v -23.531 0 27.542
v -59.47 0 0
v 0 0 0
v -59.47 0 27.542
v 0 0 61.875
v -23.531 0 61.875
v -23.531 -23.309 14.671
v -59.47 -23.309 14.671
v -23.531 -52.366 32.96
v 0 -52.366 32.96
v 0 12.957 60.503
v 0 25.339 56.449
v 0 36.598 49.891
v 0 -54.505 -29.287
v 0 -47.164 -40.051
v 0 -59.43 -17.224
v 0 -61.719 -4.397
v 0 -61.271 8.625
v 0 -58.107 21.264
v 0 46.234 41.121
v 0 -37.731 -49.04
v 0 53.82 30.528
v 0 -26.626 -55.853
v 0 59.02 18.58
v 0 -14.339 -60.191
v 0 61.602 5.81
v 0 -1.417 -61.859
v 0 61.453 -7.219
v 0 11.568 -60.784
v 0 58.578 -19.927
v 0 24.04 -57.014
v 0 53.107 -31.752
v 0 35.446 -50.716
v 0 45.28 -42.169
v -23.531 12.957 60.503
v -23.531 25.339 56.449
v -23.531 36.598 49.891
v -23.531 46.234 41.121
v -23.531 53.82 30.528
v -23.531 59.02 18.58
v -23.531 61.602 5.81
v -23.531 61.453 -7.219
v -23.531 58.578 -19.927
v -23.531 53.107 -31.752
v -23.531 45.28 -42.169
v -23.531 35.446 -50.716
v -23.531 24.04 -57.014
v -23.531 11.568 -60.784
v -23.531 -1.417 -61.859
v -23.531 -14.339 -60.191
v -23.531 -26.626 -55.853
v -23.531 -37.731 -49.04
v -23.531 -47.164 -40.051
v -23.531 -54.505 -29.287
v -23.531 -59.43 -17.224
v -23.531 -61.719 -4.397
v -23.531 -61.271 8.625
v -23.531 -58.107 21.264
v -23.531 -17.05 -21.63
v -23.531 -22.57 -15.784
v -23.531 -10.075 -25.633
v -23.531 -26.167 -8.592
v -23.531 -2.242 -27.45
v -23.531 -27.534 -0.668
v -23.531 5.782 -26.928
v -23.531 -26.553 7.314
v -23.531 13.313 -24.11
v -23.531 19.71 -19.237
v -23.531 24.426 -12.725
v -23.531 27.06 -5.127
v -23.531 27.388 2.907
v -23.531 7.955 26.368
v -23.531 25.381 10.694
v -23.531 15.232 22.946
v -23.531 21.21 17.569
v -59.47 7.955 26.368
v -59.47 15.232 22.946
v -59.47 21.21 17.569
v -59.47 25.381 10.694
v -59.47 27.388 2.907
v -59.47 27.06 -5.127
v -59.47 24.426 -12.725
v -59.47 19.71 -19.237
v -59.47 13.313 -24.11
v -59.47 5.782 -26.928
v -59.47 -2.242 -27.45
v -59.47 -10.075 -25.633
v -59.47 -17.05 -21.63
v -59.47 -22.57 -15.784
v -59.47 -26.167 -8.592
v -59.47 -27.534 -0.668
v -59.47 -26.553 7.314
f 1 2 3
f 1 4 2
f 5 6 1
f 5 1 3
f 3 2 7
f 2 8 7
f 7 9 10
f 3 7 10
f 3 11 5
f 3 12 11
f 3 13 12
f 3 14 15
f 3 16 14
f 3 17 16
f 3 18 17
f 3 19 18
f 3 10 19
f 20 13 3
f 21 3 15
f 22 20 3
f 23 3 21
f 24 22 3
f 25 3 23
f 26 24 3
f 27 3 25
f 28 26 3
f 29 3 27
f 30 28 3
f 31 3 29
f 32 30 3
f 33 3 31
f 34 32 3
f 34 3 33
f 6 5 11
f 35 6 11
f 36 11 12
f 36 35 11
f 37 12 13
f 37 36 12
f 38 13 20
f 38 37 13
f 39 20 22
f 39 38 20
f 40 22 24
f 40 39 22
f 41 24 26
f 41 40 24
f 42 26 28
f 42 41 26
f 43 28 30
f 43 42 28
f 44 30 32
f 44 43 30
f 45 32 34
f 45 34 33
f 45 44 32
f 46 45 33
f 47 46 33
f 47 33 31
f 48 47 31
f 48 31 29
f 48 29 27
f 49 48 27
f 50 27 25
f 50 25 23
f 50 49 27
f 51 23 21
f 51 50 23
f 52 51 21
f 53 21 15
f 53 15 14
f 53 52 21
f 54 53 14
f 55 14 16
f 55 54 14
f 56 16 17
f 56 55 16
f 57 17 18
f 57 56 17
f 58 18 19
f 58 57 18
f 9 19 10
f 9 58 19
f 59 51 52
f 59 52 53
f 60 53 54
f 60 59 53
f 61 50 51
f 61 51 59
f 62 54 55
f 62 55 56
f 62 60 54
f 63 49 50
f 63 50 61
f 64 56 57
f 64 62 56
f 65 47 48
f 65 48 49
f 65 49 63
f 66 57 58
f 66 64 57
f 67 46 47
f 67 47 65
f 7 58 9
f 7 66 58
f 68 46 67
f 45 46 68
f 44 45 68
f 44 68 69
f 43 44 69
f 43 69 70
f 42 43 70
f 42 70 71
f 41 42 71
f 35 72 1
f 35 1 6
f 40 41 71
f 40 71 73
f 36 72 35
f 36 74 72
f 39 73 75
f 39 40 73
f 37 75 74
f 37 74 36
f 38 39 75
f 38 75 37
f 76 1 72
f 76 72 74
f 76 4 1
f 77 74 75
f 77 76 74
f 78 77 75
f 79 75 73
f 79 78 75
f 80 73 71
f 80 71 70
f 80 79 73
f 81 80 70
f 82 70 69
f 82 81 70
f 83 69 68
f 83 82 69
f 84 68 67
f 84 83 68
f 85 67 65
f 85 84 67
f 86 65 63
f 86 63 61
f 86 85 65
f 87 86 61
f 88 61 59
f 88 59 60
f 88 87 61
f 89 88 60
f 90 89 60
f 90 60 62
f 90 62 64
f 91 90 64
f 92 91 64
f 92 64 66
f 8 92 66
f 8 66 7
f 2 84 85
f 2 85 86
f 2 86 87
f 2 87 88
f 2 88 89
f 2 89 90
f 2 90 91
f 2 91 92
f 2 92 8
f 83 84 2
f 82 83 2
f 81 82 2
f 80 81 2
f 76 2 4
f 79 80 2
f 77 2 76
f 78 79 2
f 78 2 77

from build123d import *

# Parameters (mm, degrees)
F1_ANGLE = 302.187437


with BuildPart() as f1:
    # F0 (on Front) → F1 (revolve)
    with BuildSketch(Plane.XZ):
        Polygon((-59.469521, 0), (0, 0), (0, 61.875202), (-23.531104, 61.875202), (-23.531104, 27.541725), (-59.469521, 27.541725), align=None)
    revolve(axis=Axis((-29.734761, 0, 0), (-1, 0, 0)), revolution_arc=F1_ANGLE)


solid = f1.part
